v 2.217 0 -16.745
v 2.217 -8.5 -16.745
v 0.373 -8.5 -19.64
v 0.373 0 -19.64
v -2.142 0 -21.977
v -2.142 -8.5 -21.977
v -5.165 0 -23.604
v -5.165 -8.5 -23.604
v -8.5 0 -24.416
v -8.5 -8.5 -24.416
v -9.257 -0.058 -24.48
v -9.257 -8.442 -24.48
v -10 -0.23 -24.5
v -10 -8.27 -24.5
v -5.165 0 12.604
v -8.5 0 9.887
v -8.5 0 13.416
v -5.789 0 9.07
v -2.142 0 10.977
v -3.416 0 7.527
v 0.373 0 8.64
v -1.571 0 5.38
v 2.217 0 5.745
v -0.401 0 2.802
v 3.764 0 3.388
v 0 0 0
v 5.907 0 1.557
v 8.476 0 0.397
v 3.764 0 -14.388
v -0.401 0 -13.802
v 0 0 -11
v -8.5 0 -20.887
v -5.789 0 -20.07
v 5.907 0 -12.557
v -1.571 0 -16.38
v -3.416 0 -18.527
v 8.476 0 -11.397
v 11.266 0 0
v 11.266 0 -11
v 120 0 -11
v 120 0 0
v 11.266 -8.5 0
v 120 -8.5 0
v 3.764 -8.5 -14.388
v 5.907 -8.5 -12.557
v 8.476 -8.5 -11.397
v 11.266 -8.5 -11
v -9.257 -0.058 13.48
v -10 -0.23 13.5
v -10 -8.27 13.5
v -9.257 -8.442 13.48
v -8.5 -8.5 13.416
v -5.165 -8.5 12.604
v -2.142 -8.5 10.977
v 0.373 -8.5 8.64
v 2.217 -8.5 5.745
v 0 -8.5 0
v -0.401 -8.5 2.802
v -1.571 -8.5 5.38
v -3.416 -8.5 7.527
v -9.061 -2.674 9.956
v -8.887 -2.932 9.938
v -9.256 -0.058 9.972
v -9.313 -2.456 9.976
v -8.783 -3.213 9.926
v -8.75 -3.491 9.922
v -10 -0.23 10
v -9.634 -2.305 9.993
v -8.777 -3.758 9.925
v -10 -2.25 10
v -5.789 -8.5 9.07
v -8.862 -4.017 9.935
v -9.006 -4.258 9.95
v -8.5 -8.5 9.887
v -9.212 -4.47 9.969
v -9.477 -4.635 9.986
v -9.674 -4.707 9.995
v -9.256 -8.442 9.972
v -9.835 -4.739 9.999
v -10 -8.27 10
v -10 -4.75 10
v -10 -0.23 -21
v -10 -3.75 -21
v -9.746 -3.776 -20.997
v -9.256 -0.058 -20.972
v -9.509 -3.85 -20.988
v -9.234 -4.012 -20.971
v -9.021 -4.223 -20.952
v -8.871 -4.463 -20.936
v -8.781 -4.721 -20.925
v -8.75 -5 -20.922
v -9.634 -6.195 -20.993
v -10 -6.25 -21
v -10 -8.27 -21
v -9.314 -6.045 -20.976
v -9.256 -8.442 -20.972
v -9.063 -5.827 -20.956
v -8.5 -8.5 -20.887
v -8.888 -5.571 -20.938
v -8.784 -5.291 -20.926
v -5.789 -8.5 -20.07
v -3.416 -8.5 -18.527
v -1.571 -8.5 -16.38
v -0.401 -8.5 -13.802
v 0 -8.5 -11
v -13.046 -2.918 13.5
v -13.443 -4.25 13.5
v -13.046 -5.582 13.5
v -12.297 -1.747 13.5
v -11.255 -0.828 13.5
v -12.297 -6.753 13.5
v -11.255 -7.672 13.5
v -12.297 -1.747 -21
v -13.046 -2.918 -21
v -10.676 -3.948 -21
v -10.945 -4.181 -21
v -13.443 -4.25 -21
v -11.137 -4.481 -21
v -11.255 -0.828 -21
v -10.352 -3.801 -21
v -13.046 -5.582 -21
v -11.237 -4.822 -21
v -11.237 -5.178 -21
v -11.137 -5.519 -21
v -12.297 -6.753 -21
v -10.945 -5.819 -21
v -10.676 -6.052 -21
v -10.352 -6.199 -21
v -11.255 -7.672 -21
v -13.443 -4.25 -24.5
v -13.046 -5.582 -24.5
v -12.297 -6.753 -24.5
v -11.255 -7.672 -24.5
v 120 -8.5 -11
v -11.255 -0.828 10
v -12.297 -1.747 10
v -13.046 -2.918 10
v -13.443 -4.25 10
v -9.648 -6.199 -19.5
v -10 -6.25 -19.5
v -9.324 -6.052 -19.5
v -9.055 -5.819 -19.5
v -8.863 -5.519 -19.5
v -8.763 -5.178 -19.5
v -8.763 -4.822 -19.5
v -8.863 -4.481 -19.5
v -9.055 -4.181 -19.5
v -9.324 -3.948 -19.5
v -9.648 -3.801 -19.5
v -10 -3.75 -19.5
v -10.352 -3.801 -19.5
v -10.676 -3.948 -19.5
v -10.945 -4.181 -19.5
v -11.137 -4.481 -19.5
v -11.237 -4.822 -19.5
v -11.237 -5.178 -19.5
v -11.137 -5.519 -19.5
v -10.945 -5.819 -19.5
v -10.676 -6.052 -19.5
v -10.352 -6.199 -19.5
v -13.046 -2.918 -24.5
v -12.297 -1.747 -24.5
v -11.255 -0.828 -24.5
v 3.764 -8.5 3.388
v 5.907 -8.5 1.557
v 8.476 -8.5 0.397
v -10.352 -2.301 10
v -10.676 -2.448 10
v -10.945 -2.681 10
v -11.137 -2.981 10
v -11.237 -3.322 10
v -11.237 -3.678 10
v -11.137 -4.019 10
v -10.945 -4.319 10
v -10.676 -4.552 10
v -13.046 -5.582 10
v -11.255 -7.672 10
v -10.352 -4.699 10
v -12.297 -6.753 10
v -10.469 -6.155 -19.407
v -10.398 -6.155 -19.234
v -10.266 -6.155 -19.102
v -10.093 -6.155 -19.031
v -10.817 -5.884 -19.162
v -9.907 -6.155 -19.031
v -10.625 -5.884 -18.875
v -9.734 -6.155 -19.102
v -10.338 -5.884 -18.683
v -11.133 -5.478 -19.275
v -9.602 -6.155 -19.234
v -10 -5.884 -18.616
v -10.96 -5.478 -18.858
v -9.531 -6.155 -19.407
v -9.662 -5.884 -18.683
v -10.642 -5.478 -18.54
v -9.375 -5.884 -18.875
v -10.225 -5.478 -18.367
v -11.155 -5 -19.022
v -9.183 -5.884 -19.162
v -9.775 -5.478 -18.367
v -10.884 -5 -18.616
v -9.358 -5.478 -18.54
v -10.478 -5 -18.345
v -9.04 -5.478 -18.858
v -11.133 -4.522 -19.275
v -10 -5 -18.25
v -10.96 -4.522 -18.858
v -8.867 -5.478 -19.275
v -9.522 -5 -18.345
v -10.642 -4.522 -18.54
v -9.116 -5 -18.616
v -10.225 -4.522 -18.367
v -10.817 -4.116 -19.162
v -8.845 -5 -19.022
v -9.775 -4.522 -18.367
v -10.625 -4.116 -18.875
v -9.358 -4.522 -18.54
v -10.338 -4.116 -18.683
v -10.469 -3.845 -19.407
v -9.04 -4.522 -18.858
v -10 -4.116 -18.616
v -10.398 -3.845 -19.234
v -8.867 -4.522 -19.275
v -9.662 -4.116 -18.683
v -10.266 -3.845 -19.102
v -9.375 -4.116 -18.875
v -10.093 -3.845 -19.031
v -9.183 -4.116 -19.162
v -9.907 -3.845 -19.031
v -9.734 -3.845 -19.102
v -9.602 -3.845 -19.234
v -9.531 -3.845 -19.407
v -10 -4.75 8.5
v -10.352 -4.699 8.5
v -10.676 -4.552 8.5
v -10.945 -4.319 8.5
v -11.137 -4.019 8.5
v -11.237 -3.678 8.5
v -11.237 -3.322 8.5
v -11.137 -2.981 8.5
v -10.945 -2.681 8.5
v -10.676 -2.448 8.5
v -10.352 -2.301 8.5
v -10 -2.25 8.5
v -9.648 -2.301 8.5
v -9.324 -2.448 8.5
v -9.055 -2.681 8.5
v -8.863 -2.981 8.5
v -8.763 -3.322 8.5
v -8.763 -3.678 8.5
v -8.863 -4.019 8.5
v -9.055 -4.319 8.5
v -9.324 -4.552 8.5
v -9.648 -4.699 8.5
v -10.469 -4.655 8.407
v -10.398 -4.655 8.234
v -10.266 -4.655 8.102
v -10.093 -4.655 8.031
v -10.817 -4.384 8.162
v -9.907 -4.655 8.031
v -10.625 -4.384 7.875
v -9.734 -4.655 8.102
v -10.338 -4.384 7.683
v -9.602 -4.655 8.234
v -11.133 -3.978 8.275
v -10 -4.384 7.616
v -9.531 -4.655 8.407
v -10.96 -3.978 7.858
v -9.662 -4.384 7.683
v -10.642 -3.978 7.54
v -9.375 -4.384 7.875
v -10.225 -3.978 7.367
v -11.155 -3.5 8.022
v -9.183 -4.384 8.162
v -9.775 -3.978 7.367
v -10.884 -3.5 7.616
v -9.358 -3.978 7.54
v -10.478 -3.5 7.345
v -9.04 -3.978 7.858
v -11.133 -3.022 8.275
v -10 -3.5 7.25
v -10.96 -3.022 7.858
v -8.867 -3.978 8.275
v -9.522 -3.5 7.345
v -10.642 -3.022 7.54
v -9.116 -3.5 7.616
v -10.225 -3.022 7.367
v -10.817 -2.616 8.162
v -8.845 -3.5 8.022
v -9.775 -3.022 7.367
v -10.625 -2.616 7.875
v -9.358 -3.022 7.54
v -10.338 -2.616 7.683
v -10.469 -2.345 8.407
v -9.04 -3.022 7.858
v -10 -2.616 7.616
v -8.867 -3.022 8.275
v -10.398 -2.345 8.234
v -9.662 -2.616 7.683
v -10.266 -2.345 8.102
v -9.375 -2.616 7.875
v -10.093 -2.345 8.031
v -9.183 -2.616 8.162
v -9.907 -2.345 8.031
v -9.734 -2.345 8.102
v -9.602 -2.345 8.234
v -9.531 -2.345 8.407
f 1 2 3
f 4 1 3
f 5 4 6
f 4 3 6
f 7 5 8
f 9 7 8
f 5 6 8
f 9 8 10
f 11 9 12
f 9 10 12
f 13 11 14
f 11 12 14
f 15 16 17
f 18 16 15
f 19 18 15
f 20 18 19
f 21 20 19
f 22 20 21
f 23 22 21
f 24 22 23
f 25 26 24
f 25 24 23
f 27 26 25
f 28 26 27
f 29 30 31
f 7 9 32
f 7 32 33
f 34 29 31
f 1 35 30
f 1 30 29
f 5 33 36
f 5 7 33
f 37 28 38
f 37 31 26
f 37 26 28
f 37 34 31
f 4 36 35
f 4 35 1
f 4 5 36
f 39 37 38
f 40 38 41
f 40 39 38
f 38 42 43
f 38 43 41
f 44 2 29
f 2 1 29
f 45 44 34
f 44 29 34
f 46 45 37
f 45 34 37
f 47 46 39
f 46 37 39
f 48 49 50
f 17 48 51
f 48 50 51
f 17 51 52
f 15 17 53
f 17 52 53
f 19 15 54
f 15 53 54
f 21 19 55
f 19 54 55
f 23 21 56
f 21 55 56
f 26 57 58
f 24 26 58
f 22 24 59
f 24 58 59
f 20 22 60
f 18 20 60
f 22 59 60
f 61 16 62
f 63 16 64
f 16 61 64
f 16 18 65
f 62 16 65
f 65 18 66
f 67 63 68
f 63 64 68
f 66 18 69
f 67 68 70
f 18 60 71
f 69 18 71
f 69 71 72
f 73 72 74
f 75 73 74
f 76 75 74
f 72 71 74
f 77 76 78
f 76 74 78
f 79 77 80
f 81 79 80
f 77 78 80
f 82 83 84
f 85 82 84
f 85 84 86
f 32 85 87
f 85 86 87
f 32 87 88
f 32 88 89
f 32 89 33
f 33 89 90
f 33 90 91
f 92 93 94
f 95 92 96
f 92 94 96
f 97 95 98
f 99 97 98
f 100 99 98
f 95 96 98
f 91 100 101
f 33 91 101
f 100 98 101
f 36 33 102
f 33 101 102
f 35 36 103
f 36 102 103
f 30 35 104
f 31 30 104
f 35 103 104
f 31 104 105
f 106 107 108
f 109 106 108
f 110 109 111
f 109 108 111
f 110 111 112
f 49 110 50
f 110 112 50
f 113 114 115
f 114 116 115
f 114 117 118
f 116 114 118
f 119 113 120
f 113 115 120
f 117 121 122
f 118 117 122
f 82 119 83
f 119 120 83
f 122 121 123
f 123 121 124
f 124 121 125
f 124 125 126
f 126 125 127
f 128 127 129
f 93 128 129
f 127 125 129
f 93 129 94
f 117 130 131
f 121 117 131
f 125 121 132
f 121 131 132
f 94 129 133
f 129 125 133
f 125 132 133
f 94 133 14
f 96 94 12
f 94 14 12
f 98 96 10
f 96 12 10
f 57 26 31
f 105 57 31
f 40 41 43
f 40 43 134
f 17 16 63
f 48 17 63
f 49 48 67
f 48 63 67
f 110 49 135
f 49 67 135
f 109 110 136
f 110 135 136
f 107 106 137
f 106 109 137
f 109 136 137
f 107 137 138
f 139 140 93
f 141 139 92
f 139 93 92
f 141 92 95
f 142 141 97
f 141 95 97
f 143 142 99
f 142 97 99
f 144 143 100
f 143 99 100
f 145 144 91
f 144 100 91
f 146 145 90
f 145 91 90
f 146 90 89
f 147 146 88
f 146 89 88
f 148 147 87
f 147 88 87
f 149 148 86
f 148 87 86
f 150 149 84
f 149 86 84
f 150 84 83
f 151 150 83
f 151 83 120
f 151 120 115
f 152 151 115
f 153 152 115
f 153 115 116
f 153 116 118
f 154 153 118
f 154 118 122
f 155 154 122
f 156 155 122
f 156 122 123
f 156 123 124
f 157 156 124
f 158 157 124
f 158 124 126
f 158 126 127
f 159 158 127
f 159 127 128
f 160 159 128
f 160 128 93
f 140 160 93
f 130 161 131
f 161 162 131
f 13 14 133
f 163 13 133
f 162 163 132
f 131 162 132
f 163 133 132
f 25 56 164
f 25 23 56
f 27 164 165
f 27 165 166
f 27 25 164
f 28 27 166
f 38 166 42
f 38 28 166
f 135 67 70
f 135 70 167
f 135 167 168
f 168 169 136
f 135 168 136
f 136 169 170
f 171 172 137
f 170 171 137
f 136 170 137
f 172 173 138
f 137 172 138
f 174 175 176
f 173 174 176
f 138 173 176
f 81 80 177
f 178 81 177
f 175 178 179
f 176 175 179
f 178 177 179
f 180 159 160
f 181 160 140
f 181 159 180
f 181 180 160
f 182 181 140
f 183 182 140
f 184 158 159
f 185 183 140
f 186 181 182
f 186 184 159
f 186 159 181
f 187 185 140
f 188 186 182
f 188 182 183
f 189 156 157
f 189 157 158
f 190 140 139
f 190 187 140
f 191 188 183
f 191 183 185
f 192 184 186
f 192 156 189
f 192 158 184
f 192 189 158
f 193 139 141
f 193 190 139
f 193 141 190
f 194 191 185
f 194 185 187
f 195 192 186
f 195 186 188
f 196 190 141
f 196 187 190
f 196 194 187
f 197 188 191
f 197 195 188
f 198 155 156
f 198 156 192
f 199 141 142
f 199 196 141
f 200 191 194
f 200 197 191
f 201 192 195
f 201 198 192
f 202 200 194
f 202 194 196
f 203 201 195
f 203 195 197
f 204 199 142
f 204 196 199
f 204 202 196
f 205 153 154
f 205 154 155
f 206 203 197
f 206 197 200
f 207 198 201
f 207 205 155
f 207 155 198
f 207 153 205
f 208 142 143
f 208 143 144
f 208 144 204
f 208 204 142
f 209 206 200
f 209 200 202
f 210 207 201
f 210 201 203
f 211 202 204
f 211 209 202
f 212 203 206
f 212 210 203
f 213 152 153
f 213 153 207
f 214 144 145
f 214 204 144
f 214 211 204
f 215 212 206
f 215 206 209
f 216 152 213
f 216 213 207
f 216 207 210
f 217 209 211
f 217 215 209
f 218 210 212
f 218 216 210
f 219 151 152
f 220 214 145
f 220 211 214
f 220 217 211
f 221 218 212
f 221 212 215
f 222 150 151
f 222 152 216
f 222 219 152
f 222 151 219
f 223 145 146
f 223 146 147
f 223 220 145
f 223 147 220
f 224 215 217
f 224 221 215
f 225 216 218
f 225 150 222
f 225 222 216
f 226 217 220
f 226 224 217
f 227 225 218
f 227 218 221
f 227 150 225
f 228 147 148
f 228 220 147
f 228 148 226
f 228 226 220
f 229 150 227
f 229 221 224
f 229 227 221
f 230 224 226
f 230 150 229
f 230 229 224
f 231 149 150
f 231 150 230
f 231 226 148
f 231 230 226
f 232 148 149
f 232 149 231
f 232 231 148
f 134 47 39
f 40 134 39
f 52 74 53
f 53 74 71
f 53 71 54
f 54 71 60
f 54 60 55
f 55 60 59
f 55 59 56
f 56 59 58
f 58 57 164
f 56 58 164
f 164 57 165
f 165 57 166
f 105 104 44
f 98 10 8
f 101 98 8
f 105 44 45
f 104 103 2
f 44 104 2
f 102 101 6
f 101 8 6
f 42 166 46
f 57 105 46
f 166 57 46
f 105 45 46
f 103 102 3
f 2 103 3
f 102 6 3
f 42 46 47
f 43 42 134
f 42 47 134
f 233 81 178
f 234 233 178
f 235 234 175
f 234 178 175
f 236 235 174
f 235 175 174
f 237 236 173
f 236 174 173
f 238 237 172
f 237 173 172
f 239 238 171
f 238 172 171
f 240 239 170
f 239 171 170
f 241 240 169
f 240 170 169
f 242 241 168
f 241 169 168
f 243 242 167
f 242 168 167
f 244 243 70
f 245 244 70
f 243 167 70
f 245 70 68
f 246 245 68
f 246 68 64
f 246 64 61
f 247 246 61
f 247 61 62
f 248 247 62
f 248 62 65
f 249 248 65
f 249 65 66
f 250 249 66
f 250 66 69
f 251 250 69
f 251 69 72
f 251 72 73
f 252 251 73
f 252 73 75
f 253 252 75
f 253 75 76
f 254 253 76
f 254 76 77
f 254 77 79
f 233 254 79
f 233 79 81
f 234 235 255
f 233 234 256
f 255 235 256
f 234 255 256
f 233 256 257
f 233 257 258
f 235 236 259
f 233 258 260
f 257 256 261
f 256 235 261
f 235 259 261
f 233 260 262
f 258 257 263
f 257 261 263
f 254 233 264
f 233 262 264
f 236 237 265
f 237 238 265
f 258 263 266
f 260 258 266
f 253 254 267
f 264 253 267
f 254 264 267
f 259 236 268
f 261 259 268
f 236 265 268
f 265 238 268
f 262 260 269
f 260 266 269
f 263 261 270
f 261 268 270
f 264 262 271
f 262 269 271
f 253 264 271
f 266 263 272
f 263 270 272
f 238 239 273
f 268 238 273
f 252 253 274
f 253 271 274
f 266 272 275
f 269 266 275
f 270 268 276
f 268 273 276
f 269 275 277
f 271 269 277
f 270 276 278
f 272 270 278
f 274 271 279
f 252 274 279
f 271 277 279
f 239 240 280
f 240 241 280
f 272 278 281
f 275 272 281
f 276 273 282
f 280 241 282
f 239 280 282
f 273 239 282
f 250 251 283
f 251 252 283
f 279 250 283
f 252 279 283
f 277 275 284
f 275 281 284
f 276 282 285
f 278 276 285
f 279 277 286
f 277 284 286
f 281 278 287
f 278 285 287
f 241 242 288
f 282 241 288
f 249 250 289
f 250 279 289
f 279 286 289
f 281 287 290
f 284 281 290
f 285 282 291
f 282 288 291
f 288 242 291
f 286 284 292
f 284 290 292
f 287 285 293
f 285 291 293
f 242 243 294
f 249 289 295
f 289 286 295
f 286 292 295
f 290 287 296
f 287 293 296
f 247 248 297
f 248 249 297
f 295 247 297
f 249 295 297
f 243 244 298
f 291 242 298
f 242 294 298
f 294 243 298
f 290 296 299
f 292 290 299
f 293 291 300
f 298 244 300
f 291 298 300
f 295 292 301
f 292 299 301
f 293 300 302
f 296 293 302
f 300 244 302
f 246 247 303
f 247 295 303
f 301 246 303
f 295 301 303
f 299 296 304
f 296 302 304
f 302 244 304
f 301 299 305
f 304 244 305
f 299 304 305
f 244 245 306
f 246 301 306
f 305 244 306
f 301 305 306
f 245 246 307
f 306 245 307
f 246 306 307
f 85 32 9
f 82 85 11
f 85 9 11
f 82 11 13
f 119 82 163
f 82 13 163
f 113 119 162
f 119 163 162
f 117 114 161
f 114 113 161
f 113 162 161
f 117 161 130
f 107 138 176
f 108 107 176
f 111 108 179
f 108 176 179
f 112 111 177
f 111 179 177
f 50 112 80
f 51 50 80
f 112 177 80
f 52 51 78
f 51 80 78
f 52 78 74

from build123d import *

# Parameters (mm, degrees)
SKETCH1_W           = 11
SKETCH1_H           = 8.5
BOSS_EXTRUDE1_DEPTH = 120
BOSS_EXTRUDE3_START = -8.5
BOSS_EXTRUDE3_DEPTH = 8.5
FILLET5_R           = 10
FILLET6_R           = 5
SKETCH18_R          = 1.25
BOSS_EXTRUDE4_DEPTH = 1.5
SKETCH19_R          = 1.25
BOSS_EXTRUDE5_DEPTH = 1.5
REVOLVE9_ANGLE      = 180
REVOLVE10_ANGLE     = 180


with BuildPart() as part:
    # Sketch1 → Boss-Extrude1 (new body)
    with BuildSketch(Plane(origin=(0, 0, 0), x_dir=(0, 0, -1), z_dir=(1, 0, 0))):
        with Locations((5.5, -4.25)):
            Rectangle(SKETCH1_W, SKETCH1_H)
    extrude(amount=BOSS_EXTRUDE1_DEPTH)

    # Sketch17 → Boss-Extrude3 (add)
    with BuildSketch(Plane(origin=(0, 0, 0), x_dir=(1, 0, 0), z_dir=(0, 1, 0)).offset(BOSS_EXTRUDE3_START)):
        with BuildLine():
            Line((-10, -10), (-13.5, -10))
            Line((-13.5, -10), (-13.5, -13.5))
            Line((-13.5, -13.5), (-10, -13.5))
            ThreePointArc((-10, -13.5), (-0.454058454, -9.545941546), (3.5, 0))
            Line((3.5, 0), (3.5, 11))
            ThreePointArc((3.5, 11), (-0.454058454, 20.545941546), (-10, 24.5))
            Line((-10, 24.5), (-13.5, 24.5))
            Line((-13.5, 24.5), (-13.5, 21))
            Line((-13.5, 21), (-10, 21))
            ThreePointArc((-10, 21), (-2.928932188, 18.071067812), (0, 11))
            Line((0, 11), (0, 0))
            ThreePointArc((0, 0), (-2.928932188, -7.071067812), (-10, -10))
        make_face()
    extrude(amount=BOSS_EXTRUDE3_DEPTH)

    # Fillet5
    fillet5_edges = [part.edges().sort_by_distance(p)[0] for p in [
        (3.5, -4.25, 0),
        (3.5, -4.25, -11),
    ]]
    fillet(fillet5_edges, radius=FILLET5_R)

    # Fillet6
    # the kernel refuses this fillet: 5 mm, written as the material it takes off along each edge
    with BuildSketch(Plane(origin=(-13.5, -8.5, -2.5), x_dir=(0, 1, 0), z_dir=(0, 0, 1)), Plane(origin=(-13.5, 0, -2.5), x_dir=(1, 0, 0), z_dir=(0, 0, 1)), Plane(origin=(-13.5, -8.5, -37), x_dir=(0, 1, 0), z_dir=(0, 0, 1)), Plane(origin=(-13.5, 0, -37), x_dir=(1, 0, 0), z_dir=(0, 0, 1))) as fillet6_piece_1:
        with BuildLine():
            CenterArc((FILLET6_R, -FILLET6_R), FILLET6_R, 90, 90)
            Line((0, -FILLET6_R), (0, 0))
            Line((0, 0), (FILLET6_R, 0))
        make_face()
    extrude(amount=28.5, mode=Mode.SUBTRACT)

    # Sketch18 → Boss-Extrude4 (add)
    with BuildSketch(Plane.XY.offset(-21)):
        with Locations(Location((-10, -5, 0), (0, 0, 270))):
            Circle(SKETCH18_R)
    extrude(amount=BOSS_EXTRUDE4_DEPTH)

    # Sketch19 → Boss-Extrude5 (add)
    with BuildSketch(Plane(origin=(0, 0, 10), x_dir=(-1, 0, 0), z_dir=(0, 0, -1))):
        with Locations(Location((10, -3.5, 0), (0, 0, 269.999999996))):
            Circle(SKETCH19_R)
    extrude(amount=BOSS_EXTRUDE5_DEPTH)

    # Sketch24 → Revolve9 (revolve)
    with BuildSketch(Plane(origin=(0, 0, 8.5), x_dir=(-1, 0, 0), z_dir=(0, 0, -1))):
        with BuildLine():
            Line((10, -2.25), (10, -4.75))
            ThreePointArc((10, -4.75), (11.25, -3.5), (10, -2.25))
        make_face()
    revolve(axis=Axis((-10, -2.25, 8.5), (0, -1, 0)), revolution_arc=REVOLVE9_ANGLE)

    # Sketch25 → Revolve10 (revolve)
    with BuildSketch(Plane.XY.offset(-19.5)):
        with BuildLine():
            Line((-10, -3.75), (-10, -6.25))
            ThreePointArc((-10, -6.25), (-11.25, -5), (-10, -3.75))
        make_face()
    revolve(axis=Axis((-10, -3.75, -19.5), (0, 1, 0)), revolution_arc=REVOLVE10_ANGLE)


solid = part.part
